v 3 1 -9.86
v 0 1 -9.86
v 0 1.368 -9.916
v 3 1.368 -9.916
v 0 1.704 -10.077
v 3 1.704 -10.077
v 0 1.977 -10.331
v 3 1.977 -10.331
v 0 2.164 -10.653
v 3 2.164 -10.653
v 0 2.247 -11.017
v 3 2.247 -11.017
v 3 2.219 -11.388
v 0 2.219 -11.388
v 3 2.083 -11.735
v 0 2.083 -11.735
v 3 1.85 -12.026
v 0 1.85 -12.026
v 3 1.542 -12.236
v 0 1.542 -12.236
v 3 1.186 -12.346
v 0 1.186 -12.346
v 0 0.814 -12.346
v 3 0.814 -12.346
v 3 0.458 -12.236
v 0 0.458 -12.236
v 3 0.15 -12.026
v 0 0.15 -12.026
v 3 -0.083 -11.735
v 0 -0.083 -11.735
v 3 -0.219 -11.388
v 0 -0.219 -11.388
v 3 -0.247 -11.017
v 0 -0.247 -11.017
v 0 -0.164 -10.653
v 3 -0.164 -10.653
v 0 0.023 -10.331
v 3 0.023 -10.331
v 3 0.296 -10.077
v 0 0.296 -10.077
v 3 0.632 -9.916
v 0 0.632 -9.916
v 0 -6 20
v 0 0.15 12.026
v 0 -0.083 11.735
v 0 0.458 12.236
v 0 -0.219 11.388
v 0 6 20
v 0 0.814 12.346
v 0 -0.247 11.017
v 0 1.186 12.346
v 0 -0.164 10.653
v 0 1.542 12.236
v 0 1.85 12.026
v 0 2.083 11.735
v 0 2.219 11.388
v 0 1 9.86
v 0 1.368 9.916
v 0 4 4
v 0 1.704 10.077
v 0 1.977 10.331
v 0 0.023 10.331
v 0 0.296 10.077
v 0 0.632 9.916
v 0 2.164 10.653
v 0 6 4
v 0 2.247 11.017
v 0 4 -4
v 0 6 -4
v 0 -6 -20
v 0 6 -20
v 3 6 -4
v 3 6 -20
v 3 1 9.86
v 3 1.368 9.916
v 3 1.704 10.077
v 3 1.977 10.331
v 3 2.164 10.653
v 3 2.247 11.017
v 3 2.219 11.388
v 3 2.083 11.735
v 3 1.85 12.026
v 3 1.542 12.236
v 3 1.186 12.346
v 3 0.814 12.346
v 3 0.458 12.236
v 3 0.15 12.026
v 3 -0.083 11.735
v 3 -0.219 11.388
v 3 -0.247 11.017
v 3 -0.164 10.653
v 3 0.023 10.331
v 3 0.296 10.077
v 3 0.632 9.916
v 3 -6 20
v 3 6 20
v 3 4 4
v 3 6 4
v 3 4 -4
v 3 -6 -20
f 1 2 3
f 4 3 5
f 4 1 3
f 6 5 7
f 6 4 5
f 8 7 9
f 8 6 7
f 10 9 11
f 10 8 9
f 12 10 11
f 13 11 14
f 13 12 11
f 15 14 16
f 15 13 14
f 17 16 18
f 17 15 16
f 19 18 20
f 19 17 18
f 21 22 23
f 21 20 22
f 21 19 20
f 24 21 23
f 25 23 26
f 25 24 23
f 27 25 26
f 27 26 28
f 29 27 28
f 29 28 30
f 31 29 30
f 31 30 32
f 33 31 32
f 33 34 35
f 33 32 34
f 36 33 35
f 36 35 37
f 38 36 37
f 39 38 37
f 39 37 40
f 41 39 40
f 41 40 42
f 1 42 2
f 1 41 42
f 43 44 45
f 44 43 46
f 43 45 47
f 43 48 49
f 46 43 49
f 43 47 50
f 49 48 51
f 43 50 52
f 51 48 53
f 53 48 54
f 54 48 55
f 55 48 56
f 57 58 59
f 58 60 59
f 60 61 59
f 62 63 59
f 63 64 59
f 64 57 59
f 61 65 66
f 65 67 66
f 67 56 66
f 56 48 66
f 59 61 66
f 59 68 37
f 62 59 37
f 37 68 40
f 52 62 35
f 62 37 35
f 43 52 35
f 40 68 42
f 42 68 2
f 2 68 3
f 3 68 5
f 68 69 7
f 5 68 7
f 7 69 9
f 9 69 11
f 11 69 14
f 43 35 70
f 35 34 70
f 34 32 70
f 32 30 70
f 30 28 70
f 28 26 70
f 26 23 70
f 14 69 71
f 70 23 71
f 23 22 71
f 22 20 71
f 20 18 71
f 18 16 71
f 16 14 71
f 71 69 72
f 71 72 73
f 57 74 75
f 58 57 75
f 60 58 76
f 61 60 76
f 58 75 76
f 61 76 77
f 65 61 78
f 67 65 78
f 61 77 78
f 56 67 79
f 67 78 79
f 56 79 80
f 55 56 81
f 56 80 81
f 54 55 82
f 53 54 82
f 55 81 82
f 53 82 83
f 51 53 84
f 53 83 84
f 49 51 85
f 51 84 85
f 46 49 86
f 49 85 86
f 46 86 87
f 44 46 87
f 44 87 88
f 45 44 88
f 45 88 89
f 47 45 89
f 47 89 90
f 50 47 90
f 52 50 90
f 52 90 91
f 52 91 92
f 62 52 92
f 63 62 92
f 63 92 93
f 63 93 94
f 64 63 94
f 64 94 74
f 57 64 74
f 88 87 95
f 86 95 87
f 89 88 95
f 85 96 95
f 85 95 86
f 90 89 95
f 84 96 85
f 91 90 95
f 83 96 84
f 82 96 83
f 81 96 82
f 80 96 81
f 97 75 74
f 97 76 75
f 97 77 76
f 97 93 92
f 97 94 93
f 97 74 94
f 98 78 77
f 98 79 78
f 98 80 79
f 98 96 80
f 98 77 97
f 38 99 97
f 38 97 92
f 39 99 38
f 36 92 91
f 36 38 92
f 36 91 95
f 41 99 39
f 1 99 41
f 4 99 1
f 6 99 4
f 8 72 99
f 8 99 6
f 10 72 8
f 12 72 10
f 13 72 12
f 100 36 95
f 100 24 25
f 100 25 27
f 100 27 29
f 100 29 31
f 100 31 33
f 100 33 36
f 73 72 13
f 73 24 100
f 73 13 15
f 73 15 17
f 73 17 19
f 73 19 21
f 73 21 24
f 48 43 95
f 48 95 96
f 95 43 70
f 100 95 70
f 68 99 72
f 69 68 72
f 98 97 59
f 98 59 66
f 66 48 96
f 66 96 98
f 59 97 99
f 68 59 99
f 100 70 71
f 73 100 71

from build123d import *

# Parameters (mm, degrees)
SKETCH1_W           = 40
SKETCH1_H           = 12
BOSS_EXTRUDE1_DEPTH = 3
SKETCH2_R           = 1.25
SKETCH2_W           = 8
SKETCH2_H           = 2
CUT_EXTRUDE1_DEPTH  = 5


with BuildPart() as part:
    # Sketch1 → Boss-Extrude1 (new body)
    with BuildSketch(Plane(origin=(0, 0, 0), x_dir=(0, 0, -1), z_dir=(1, 0, 0))):
        Rectangle(SKETCH1_W, SKETCH1_H)
    extrude(amount=BOSS_EXTRUDE1_DEPTH)

    # Sketch2 → Cut-Extrude1 (cut)
    with BuildSketch(Plane(origin=(3, 0, 0), x_dir=(0, 0, -1), z_dir=(1, 0, 0))):
        with Locations((-11.11, 1)):
            Circle(SKETCH2_R)
        with Locations((0, 5)):
            Rectangle(SKETCH2_W, SKETCH2_H)
    cut_extrude1 = extrude(amount=-CUT_EXTRUDE1_DEPTH, mode=Mode.SUBTRACT)

    # Mirror1: Cut-Extrude1 across plane
    add(cut_extrude1.mirror(Plane.XY), mode=Mode.SUBTRACT)


solid = part.part
